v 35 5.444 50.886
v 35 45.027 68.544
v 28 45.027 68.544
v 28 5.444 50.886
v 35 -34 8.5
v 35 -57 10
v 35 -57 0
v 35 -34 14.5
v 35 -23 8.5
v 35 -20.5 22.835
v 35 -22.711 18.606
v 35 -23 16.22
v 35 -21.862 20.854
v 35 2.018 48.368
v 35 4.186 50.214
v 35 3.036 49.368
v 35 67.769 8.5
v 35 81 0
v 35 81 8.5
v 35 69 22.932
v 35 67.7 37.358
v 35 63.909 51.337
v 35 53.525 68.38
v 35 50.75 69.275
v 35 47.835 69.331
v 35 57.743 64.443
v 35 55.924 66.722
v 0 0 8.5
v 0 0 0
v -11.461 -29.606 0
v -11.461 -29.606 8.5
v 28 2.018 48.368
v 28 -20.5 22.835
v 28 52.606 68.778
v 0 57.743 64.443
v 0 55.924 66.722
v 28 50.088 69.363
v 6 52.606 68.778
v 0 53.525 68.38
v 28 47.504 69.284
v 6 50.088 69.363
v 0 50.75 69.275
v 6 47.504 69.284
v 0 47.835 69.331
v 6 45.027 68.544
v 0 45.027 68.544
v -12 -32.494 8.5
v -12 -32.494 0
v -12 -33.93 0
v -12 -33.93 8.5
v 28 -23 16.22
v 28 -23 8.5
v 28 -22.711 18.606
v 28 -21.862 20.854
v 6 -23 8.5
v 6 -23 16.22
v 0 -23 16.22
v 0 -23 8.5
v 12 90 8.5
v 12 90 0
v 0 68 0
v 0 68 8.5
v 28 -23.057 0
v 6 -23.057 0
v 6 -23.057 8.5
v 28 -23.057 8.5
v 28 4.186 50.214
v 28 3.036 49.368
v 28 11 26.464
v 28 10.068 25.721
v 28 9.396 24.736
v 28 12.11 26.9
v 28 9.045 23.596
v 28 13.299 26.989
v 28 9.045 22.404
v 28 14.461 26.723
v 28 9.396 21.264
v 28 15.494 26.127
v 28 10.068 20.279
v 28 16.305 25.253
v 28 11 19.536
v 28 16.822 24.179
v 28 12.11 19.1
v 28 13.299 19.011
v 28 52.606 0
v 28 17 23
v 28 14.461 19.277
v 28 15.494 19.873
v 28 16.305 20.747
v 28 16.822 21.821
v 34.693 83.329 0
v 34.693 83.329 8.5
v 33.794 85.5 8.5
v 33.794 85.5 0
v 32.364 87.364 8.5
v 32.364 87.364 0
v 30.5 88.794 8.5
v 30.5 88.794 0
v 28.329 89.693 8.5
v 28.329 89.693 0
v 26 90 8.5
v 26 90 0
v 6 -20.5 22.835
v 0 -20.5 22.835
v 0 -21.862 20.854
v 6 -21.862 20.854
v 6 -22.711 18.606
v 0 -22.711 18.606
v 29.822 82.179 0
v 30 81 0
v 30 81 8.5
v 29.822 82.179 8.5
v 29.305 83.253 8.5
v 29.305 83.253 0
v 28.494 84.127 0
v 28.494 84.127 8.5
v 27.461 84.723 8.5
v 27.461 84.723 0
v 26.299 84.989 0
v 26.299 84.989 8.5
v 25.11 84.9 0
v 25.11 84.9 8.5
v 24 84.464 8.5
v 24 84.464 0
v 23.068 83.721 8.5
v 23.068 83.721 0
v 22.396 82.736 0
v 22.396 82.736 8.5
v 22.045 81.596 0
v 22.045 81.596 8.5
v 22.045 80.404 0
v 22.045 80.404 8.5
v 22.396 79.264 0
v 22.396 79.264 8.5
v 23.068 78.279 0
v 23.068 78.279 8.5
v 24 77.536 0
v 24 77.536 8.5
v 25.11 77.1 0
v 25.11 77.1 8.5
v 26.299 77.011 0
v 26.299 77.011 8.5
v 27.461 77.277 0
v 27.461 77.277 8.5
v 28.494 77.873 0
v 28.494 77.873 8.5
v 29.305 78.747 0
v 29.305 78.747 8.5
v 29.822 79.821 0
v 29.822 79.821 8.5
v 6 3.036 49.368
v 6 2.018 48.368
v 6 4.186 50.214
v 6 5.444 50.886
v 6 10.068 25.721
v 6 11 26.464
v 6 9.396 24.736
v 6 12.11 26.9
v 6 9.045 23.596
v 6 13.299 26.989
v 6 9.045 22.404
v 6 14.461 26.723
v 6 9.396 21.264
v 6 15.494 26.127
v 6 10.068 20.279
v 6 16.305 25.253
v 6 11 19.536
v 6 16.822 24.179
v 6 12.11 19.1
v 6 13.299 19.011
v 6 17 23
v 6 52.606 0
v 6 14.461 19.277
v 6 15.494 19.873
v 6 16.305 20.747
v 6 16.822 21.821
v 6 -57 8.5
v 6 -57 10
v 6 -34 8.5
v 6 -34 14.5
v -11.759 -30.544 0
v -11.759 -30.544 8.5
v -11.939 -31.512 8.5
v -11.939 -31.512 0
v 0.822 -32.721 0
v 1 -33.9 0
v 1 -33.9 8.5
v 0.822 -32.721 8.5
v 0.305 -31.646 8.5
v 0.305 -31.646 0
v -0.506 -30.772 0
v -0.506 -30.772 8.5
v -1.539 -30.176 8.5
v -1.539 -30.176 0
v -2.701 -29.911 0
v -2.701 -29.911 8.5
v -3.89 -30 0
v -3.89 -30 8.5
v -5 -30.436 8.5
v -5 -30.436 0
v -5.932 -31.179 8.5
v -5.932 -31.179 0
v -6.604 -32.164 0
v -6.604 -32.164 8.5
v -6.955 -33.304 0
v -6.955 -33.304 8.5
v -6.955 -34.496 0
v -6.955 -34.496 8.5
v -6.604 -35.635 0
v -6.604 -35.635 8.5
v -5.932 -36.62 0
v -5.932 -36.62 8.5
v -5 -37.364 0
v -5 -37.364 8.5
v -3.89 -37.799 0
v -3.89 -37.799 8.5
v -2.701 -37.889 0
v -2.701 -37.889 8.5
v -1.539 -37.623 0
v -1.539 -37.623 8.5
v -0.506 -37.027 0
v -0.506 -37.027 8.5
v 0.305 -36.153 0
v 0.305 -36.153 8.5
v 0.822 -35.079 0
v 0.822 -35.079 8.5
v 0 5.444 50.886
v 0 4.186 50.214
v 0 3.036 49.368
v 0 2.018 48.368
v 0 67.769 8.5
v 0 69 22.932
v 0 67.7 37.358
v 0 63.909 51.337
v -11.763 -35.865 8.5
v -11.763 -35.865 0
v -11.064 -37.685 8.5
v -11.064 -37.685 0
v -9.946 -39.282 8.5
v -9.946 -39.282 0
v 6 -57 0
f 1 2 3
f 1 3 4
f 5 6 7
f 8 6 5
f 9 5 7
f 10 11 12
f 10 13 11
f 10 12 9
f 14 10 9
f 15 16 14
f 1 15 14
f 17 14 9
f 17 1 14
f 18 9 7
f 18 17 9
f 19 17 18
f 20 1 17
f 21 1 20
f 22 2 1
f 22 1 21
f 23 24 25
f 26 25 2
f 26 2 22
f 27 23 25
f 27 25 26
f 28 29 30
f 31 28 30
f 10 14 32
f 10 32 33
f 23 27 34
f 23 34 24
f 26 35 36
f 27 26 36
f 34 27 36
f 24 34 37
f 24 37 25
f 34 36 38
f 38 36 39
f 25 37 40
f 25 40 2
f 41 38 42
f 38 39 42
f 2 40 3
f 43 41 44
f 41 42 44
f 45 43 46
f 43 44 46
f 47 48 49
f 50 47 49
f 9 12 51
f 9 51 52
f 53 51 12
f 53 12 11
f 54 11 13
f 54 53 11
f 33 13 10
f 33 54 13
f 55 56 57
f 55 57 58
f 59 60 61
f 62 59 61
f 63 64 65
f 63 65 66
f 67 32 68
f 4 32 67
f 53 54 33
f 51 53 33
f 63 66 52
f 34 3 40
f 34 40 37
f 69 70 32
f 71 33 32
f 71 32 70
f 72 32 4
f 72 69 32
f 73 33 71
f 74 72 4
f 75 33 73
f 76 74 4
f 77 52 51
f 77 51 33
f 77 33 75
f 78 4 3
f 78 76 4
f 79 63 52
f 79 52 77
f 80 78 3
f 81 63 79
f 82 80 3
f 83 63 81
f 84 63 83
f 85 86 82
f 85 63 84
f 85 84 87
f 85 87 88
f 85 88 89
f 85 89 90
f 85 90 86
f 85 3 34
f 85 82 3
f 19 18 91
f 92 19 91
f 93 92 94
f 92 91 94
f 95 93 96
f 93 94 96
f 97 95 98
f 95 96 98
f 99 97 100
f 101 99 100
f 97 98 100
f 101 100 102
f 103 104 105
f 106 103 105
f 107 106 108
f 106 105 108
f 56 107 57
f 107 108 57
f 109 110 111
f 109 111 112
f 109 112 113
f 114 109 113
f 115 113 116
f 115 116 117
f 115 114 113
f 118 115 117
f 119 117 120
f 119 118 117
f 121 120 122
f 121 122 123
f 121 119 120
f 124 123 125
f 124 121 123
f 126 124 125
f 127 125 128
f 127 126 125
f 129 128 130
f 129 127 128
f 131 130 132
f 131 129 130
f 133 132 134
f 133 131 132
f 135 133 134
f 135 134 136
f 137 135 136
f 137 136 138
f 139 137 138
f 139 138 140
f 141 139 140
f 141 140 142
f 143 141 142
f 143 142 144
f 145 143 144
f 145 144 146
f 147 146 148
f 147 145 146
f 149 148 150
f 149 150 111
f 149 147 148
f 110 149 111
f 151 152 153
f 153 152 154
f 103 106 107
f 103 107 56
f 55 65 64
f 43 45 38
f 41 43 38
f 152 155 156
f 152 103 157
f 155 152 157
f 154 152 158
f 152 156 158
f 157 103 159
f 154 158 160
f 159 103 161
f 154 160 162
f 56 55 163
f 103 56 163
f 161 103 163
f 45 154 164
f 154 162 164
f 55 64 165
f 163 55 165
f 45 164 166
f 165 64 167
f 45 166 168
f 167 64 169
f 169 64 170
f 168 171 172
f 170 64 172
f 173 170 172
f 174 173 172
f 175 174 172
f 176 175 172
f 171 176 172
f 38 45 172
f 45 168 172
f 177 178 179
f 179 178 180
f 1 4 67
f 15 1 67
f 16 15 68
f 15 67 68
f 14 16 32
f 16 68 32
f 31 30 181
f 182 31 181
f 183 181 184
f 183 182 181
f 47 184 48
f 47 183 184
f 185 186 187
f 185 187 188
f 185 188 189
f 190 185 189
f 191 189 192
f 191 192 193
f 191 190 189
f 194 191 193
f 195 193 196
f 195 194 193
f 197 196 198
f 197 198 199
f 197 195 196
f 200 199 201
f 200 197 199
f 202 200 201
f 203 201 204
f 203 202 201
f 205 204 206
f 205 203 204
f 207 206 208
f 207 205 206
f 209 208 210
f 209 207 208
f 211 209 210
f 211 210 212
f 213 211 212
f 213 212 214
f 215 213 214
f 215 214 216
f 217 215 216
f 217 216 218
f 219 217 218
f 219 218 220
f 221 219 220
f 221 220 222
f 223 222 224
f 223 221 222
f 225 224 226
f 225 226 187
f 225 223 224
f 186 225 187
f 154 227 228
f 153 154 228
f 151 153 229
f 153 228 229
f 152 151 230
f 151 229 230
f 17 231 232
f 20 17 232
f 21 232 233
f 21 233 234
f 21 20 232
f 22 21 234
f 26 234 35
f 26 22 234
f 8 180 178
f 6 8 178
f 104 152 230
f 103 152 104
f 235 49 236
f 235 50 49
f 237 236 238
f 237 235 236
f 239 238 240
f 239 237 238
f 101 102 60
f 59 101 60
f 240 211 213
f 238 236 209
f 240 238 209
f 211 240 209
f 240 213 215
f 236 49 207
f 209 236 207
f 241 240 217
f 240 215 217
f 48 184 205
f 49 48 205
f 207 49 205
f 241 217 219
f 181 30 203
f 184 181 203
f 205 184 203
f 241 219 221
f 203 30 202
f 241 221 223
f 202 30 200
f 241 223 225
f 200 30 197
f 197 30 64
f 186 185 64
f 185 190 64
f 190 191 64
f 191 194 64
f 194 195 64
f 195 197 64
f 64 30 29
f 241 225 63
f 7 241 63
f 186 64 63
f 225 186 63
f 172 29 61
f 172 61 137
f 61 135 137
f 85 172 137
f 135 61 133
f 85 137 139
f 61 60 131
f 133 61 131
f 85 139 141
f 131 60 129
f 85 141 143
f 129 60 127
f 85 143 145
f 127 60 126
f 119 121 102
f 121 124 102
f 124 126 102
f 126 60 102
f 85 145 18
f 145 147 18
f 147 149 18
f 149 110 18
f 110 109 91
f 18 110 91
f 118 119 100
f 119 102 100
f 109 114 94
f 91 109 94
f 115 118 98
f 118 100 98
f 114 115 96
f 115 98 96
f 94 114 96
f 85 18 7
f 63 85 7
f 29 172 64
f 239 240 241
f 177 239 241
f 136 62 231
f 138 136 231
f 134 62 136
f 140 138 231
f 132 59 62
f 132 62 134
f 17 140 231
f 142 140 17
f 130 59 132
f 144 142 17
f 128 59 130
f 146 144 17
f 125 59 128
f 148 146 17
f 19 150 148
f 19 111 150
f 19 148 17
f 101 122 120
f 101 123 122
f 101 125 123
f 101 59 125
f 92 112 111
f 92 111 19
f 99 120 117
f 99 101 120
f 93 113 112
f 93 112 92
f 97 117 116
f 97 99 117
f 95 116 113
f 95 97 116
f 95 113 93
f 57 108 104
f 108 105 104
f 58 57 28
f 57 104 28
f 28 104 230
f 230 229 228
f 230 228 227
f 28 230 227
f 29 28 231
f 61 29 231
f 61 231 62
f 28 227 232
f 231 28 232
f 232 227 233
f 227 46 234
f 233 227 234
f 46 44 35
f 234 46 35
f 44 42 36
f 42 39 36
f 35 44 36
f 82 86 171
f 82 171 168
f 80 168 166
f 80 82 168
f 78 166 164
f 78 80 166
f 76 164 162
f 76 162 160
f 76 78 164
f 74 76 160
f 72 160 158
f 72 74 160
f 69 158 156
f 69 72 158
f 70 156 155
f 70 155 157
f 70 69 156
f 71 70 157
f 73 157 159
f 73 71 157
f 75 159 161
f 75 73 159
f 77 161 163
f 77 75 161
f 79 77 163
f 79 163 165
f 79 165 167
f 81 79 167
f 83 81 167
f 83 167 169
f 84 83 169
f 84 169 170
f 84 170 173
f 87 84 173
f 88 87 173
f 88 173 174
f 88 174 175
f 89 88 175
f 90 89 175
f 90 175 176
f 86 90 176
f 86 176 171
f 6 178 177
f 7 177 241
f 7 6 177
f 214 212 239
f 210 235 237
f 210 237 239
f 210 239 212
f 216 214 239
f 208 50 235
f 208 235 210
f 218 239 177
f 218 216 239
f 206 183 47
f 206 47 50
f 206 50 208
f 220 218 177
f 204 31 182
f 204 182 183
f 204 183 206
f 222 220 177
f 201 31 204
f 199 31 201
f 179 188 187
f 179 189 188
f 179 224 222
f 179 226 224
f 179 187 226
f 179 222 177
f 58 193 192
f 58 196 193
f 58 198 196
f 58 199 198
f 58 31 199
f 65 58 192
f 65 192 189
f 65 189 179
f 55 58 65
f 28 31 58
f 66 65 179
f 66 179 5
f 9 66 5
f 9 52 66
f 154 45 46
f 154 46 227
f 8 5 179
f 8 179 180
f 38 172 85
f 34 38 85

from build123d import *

# Parameters (mm, degrees)
F0_R         = 4
F1_DEPTH     = 8.5
F2_R         = 8
F4_DEPTH     = 29
F5_R         = 4
F6_DEPTH     = 35
F7_W         = 22
F7_H         = 75.6632985204
F8_DEPTH     = 72.001
F9_DEPTH     = 35
F10_T1_DEPTH = 80.2241965153
F10_T3_DEPTH = 17.8781354595
F10_T5_DEPTH = 16.8781354595
F10_T7_DEPTH = 25.8982236505
F10_T9_DEPTH = 24.8982236505


# Not quite as in the source:
# - a fillet or chamfer that OpenCascade refuses, or shapes differently, is made with other operations: its cross-section is extruded or revolved along the edge and cut away or added


with BuildPart() as f1:
    # F0 (on Top) → F1 (new body)
    with BuildSketch(Plane.XY):
        with BuildLine():
            Line((0, 68), (0, 0))
            Line((0, 0), (35, 0))
            Line((35, 0), (35, 68))
            Line((35, 68), (35, 81))
            ThreePointArc((35, 81), (32.3639610307, 87.3639610307), (26, 90))
            Line((26, 90), (12, 90))
            Line((12, 90), (0, 68))
        make_face()
        with Locations((26, 81)):
            Circle(F0_R, mode=Mode.SUBTRACT)
        Polygon((35, 0), (0, 0), (-12, -31), (-12, -37), (6, -57), (35, -57), align=None)
        with Locations((-3, -33.8997244835)):
            Circle(F0_R, mode=Mode.SUBTRACT)
    extrude(amount=F1_DEPTH)

    # F2
    f2_edges = [f1.edges().sort_by_distance(p)[0] for p in [
        (-12, -37, 4.25),
        (-12, -31, 4.25),
    ]]
    fillet(f2_edges, radius=F2_R)

    # F3 (on face) → F4 (join, through all)
    with BuildSketch(Plane.YZ.offset(35)):
        Polygon((-57, 10), (-57, 0), (-34, 0), (-34, 14.5), align=None)
    extrude(amount=-F4_DEPTH)

    # F5 (on face) → F6 (join, through all)
    with BuildSketch(Plane.YZ.offset(35)):
        with BuildLine():
            Line((-23, 20), (-23, 8.5))
            Line((-23, 8.5), (67.7691474557, 8.5))
            ThreePointArc((67.7691474557, 8.5), (66.7805333738, 41.7873112781), (52.7728251344, 72))
            Line((52.7728251344, 72), (3.4575131106, 50))
            Line((3.4575131106, 50), (-23, 20))
        make_face()
        with Locations((13, 23)):
            Circle(F5_R, mode=Mode.SUBTRACT)
    extrude(amount=-F6_DEPTH)

    # F7 (on Top) → F8 (cut, through all)
    with BuildSketch(Plane.XY):
        with Locations((17, 14.7745097056)):
            Rectangle(F7_W, F7_H)
    extrude(amount=F8_DEPTH, mode=Mode.SUBTRACT)

    # F5 (on face) → F9 (join, through all)
    with BuildSketch(Plane.YZ.offset(35)):
        with Locations((13, 23)):
            Circle(F5_R)
    extrude(amount=-F9_DEPTH)

    # F10: fillet of radius 10 on 5 edges, made by hand

    # F10_s2 → F10_t1 (cut)
    with BuildSketch(Plane.YZ.offset(-22.6120982577)):
        with BuildLine():
            ThreePointArc((57.7430836083, 64.4431720463), (52.1704386948, 68.9292292294), (45.0268385832, 68.5444463974))
            Line((45.0268385832, 68.5444463974), (52.7728251344, 72))
            ThreePointArc((52.7728251344, 72), (55.3610878115, 68.2894186982), (57.7430836083, 64.4431720463))
        make_face()
    extrude(amount=F10_T1_DEPTH, mode=Mode.SUBTRACT)

    # F10_s4 → F10_t3 (cut)
    with BuildSketch(Plane.YZ.offset(22.5609322702)):
        with BuildLine():
            ThreePointArc((5.4443969789, 50.886366593), (3.5960570103, 49.8115072456), (2.0184710529, 48.3682796811))
            Line((2.0184710529, 48.3682796811), (3.4575131106, 50))
            Line((3.4575131106, 50), (5.4443969789, 50.886366593))
        make_face()
    extrude(amount=F10_T3_DEPTH, mode=Mode.SUBTRACT)

    # F10_s6 → F10_t5 (cut)
    with BuildSketch(Plane.YZ.offset(-5.4390677298)):
        with BuildLine():
            ThreePointArc((5.4443969789, 50.886366593), (3.5960570103, 49.8115072456), (2.0184710529, 48.3682796811))
            Line((2.0184710529, 48.3682796811), (3.4575131106, 50))
            Line((3.4575131106, 50), (5.4443969789, 50.886366593))
        make_face()
    extrude(amount=F10_T5_DEPTH, mode=Mode.SUBTRACT)

    # F10_s8 → F10_t7 (cut)
    with BuildSketch(Plane.YZ.offset(18.5508881748)):
        with BuildLine():
            ThreePointArc((-23, 16.2203552699), (-22.3541434669, 19.7558891758), (-20.5, 22.8347335476))
            Line((-20.5, 22.8347335476), (-23, 20))
            Line((-23, 20), (-23, 16.2203552699))
        make_face()
    extrude(amount=F10_T7_DEPTH, mode=Mode.SUBTRACT)

    # F10_s10 → F10_t9 (cut)
    with BuildSketch(Plane.YZ.offset(-9.4491118252)):
        with BuildLine():
            ThreePointArc((-20.5, 22.8347335476), (-22.3541434669, 19.7558891758), (-23, 16.2203552699))
            Line((-23, 16.2203552699), (-23, 20))
            Line((-23, 20), (-20.5, 22.8347335476))
        make_face()
    extrude(amount=F10_T9_DEPTH, mode=Mode.SUBTRACT)


solid = f1.part
